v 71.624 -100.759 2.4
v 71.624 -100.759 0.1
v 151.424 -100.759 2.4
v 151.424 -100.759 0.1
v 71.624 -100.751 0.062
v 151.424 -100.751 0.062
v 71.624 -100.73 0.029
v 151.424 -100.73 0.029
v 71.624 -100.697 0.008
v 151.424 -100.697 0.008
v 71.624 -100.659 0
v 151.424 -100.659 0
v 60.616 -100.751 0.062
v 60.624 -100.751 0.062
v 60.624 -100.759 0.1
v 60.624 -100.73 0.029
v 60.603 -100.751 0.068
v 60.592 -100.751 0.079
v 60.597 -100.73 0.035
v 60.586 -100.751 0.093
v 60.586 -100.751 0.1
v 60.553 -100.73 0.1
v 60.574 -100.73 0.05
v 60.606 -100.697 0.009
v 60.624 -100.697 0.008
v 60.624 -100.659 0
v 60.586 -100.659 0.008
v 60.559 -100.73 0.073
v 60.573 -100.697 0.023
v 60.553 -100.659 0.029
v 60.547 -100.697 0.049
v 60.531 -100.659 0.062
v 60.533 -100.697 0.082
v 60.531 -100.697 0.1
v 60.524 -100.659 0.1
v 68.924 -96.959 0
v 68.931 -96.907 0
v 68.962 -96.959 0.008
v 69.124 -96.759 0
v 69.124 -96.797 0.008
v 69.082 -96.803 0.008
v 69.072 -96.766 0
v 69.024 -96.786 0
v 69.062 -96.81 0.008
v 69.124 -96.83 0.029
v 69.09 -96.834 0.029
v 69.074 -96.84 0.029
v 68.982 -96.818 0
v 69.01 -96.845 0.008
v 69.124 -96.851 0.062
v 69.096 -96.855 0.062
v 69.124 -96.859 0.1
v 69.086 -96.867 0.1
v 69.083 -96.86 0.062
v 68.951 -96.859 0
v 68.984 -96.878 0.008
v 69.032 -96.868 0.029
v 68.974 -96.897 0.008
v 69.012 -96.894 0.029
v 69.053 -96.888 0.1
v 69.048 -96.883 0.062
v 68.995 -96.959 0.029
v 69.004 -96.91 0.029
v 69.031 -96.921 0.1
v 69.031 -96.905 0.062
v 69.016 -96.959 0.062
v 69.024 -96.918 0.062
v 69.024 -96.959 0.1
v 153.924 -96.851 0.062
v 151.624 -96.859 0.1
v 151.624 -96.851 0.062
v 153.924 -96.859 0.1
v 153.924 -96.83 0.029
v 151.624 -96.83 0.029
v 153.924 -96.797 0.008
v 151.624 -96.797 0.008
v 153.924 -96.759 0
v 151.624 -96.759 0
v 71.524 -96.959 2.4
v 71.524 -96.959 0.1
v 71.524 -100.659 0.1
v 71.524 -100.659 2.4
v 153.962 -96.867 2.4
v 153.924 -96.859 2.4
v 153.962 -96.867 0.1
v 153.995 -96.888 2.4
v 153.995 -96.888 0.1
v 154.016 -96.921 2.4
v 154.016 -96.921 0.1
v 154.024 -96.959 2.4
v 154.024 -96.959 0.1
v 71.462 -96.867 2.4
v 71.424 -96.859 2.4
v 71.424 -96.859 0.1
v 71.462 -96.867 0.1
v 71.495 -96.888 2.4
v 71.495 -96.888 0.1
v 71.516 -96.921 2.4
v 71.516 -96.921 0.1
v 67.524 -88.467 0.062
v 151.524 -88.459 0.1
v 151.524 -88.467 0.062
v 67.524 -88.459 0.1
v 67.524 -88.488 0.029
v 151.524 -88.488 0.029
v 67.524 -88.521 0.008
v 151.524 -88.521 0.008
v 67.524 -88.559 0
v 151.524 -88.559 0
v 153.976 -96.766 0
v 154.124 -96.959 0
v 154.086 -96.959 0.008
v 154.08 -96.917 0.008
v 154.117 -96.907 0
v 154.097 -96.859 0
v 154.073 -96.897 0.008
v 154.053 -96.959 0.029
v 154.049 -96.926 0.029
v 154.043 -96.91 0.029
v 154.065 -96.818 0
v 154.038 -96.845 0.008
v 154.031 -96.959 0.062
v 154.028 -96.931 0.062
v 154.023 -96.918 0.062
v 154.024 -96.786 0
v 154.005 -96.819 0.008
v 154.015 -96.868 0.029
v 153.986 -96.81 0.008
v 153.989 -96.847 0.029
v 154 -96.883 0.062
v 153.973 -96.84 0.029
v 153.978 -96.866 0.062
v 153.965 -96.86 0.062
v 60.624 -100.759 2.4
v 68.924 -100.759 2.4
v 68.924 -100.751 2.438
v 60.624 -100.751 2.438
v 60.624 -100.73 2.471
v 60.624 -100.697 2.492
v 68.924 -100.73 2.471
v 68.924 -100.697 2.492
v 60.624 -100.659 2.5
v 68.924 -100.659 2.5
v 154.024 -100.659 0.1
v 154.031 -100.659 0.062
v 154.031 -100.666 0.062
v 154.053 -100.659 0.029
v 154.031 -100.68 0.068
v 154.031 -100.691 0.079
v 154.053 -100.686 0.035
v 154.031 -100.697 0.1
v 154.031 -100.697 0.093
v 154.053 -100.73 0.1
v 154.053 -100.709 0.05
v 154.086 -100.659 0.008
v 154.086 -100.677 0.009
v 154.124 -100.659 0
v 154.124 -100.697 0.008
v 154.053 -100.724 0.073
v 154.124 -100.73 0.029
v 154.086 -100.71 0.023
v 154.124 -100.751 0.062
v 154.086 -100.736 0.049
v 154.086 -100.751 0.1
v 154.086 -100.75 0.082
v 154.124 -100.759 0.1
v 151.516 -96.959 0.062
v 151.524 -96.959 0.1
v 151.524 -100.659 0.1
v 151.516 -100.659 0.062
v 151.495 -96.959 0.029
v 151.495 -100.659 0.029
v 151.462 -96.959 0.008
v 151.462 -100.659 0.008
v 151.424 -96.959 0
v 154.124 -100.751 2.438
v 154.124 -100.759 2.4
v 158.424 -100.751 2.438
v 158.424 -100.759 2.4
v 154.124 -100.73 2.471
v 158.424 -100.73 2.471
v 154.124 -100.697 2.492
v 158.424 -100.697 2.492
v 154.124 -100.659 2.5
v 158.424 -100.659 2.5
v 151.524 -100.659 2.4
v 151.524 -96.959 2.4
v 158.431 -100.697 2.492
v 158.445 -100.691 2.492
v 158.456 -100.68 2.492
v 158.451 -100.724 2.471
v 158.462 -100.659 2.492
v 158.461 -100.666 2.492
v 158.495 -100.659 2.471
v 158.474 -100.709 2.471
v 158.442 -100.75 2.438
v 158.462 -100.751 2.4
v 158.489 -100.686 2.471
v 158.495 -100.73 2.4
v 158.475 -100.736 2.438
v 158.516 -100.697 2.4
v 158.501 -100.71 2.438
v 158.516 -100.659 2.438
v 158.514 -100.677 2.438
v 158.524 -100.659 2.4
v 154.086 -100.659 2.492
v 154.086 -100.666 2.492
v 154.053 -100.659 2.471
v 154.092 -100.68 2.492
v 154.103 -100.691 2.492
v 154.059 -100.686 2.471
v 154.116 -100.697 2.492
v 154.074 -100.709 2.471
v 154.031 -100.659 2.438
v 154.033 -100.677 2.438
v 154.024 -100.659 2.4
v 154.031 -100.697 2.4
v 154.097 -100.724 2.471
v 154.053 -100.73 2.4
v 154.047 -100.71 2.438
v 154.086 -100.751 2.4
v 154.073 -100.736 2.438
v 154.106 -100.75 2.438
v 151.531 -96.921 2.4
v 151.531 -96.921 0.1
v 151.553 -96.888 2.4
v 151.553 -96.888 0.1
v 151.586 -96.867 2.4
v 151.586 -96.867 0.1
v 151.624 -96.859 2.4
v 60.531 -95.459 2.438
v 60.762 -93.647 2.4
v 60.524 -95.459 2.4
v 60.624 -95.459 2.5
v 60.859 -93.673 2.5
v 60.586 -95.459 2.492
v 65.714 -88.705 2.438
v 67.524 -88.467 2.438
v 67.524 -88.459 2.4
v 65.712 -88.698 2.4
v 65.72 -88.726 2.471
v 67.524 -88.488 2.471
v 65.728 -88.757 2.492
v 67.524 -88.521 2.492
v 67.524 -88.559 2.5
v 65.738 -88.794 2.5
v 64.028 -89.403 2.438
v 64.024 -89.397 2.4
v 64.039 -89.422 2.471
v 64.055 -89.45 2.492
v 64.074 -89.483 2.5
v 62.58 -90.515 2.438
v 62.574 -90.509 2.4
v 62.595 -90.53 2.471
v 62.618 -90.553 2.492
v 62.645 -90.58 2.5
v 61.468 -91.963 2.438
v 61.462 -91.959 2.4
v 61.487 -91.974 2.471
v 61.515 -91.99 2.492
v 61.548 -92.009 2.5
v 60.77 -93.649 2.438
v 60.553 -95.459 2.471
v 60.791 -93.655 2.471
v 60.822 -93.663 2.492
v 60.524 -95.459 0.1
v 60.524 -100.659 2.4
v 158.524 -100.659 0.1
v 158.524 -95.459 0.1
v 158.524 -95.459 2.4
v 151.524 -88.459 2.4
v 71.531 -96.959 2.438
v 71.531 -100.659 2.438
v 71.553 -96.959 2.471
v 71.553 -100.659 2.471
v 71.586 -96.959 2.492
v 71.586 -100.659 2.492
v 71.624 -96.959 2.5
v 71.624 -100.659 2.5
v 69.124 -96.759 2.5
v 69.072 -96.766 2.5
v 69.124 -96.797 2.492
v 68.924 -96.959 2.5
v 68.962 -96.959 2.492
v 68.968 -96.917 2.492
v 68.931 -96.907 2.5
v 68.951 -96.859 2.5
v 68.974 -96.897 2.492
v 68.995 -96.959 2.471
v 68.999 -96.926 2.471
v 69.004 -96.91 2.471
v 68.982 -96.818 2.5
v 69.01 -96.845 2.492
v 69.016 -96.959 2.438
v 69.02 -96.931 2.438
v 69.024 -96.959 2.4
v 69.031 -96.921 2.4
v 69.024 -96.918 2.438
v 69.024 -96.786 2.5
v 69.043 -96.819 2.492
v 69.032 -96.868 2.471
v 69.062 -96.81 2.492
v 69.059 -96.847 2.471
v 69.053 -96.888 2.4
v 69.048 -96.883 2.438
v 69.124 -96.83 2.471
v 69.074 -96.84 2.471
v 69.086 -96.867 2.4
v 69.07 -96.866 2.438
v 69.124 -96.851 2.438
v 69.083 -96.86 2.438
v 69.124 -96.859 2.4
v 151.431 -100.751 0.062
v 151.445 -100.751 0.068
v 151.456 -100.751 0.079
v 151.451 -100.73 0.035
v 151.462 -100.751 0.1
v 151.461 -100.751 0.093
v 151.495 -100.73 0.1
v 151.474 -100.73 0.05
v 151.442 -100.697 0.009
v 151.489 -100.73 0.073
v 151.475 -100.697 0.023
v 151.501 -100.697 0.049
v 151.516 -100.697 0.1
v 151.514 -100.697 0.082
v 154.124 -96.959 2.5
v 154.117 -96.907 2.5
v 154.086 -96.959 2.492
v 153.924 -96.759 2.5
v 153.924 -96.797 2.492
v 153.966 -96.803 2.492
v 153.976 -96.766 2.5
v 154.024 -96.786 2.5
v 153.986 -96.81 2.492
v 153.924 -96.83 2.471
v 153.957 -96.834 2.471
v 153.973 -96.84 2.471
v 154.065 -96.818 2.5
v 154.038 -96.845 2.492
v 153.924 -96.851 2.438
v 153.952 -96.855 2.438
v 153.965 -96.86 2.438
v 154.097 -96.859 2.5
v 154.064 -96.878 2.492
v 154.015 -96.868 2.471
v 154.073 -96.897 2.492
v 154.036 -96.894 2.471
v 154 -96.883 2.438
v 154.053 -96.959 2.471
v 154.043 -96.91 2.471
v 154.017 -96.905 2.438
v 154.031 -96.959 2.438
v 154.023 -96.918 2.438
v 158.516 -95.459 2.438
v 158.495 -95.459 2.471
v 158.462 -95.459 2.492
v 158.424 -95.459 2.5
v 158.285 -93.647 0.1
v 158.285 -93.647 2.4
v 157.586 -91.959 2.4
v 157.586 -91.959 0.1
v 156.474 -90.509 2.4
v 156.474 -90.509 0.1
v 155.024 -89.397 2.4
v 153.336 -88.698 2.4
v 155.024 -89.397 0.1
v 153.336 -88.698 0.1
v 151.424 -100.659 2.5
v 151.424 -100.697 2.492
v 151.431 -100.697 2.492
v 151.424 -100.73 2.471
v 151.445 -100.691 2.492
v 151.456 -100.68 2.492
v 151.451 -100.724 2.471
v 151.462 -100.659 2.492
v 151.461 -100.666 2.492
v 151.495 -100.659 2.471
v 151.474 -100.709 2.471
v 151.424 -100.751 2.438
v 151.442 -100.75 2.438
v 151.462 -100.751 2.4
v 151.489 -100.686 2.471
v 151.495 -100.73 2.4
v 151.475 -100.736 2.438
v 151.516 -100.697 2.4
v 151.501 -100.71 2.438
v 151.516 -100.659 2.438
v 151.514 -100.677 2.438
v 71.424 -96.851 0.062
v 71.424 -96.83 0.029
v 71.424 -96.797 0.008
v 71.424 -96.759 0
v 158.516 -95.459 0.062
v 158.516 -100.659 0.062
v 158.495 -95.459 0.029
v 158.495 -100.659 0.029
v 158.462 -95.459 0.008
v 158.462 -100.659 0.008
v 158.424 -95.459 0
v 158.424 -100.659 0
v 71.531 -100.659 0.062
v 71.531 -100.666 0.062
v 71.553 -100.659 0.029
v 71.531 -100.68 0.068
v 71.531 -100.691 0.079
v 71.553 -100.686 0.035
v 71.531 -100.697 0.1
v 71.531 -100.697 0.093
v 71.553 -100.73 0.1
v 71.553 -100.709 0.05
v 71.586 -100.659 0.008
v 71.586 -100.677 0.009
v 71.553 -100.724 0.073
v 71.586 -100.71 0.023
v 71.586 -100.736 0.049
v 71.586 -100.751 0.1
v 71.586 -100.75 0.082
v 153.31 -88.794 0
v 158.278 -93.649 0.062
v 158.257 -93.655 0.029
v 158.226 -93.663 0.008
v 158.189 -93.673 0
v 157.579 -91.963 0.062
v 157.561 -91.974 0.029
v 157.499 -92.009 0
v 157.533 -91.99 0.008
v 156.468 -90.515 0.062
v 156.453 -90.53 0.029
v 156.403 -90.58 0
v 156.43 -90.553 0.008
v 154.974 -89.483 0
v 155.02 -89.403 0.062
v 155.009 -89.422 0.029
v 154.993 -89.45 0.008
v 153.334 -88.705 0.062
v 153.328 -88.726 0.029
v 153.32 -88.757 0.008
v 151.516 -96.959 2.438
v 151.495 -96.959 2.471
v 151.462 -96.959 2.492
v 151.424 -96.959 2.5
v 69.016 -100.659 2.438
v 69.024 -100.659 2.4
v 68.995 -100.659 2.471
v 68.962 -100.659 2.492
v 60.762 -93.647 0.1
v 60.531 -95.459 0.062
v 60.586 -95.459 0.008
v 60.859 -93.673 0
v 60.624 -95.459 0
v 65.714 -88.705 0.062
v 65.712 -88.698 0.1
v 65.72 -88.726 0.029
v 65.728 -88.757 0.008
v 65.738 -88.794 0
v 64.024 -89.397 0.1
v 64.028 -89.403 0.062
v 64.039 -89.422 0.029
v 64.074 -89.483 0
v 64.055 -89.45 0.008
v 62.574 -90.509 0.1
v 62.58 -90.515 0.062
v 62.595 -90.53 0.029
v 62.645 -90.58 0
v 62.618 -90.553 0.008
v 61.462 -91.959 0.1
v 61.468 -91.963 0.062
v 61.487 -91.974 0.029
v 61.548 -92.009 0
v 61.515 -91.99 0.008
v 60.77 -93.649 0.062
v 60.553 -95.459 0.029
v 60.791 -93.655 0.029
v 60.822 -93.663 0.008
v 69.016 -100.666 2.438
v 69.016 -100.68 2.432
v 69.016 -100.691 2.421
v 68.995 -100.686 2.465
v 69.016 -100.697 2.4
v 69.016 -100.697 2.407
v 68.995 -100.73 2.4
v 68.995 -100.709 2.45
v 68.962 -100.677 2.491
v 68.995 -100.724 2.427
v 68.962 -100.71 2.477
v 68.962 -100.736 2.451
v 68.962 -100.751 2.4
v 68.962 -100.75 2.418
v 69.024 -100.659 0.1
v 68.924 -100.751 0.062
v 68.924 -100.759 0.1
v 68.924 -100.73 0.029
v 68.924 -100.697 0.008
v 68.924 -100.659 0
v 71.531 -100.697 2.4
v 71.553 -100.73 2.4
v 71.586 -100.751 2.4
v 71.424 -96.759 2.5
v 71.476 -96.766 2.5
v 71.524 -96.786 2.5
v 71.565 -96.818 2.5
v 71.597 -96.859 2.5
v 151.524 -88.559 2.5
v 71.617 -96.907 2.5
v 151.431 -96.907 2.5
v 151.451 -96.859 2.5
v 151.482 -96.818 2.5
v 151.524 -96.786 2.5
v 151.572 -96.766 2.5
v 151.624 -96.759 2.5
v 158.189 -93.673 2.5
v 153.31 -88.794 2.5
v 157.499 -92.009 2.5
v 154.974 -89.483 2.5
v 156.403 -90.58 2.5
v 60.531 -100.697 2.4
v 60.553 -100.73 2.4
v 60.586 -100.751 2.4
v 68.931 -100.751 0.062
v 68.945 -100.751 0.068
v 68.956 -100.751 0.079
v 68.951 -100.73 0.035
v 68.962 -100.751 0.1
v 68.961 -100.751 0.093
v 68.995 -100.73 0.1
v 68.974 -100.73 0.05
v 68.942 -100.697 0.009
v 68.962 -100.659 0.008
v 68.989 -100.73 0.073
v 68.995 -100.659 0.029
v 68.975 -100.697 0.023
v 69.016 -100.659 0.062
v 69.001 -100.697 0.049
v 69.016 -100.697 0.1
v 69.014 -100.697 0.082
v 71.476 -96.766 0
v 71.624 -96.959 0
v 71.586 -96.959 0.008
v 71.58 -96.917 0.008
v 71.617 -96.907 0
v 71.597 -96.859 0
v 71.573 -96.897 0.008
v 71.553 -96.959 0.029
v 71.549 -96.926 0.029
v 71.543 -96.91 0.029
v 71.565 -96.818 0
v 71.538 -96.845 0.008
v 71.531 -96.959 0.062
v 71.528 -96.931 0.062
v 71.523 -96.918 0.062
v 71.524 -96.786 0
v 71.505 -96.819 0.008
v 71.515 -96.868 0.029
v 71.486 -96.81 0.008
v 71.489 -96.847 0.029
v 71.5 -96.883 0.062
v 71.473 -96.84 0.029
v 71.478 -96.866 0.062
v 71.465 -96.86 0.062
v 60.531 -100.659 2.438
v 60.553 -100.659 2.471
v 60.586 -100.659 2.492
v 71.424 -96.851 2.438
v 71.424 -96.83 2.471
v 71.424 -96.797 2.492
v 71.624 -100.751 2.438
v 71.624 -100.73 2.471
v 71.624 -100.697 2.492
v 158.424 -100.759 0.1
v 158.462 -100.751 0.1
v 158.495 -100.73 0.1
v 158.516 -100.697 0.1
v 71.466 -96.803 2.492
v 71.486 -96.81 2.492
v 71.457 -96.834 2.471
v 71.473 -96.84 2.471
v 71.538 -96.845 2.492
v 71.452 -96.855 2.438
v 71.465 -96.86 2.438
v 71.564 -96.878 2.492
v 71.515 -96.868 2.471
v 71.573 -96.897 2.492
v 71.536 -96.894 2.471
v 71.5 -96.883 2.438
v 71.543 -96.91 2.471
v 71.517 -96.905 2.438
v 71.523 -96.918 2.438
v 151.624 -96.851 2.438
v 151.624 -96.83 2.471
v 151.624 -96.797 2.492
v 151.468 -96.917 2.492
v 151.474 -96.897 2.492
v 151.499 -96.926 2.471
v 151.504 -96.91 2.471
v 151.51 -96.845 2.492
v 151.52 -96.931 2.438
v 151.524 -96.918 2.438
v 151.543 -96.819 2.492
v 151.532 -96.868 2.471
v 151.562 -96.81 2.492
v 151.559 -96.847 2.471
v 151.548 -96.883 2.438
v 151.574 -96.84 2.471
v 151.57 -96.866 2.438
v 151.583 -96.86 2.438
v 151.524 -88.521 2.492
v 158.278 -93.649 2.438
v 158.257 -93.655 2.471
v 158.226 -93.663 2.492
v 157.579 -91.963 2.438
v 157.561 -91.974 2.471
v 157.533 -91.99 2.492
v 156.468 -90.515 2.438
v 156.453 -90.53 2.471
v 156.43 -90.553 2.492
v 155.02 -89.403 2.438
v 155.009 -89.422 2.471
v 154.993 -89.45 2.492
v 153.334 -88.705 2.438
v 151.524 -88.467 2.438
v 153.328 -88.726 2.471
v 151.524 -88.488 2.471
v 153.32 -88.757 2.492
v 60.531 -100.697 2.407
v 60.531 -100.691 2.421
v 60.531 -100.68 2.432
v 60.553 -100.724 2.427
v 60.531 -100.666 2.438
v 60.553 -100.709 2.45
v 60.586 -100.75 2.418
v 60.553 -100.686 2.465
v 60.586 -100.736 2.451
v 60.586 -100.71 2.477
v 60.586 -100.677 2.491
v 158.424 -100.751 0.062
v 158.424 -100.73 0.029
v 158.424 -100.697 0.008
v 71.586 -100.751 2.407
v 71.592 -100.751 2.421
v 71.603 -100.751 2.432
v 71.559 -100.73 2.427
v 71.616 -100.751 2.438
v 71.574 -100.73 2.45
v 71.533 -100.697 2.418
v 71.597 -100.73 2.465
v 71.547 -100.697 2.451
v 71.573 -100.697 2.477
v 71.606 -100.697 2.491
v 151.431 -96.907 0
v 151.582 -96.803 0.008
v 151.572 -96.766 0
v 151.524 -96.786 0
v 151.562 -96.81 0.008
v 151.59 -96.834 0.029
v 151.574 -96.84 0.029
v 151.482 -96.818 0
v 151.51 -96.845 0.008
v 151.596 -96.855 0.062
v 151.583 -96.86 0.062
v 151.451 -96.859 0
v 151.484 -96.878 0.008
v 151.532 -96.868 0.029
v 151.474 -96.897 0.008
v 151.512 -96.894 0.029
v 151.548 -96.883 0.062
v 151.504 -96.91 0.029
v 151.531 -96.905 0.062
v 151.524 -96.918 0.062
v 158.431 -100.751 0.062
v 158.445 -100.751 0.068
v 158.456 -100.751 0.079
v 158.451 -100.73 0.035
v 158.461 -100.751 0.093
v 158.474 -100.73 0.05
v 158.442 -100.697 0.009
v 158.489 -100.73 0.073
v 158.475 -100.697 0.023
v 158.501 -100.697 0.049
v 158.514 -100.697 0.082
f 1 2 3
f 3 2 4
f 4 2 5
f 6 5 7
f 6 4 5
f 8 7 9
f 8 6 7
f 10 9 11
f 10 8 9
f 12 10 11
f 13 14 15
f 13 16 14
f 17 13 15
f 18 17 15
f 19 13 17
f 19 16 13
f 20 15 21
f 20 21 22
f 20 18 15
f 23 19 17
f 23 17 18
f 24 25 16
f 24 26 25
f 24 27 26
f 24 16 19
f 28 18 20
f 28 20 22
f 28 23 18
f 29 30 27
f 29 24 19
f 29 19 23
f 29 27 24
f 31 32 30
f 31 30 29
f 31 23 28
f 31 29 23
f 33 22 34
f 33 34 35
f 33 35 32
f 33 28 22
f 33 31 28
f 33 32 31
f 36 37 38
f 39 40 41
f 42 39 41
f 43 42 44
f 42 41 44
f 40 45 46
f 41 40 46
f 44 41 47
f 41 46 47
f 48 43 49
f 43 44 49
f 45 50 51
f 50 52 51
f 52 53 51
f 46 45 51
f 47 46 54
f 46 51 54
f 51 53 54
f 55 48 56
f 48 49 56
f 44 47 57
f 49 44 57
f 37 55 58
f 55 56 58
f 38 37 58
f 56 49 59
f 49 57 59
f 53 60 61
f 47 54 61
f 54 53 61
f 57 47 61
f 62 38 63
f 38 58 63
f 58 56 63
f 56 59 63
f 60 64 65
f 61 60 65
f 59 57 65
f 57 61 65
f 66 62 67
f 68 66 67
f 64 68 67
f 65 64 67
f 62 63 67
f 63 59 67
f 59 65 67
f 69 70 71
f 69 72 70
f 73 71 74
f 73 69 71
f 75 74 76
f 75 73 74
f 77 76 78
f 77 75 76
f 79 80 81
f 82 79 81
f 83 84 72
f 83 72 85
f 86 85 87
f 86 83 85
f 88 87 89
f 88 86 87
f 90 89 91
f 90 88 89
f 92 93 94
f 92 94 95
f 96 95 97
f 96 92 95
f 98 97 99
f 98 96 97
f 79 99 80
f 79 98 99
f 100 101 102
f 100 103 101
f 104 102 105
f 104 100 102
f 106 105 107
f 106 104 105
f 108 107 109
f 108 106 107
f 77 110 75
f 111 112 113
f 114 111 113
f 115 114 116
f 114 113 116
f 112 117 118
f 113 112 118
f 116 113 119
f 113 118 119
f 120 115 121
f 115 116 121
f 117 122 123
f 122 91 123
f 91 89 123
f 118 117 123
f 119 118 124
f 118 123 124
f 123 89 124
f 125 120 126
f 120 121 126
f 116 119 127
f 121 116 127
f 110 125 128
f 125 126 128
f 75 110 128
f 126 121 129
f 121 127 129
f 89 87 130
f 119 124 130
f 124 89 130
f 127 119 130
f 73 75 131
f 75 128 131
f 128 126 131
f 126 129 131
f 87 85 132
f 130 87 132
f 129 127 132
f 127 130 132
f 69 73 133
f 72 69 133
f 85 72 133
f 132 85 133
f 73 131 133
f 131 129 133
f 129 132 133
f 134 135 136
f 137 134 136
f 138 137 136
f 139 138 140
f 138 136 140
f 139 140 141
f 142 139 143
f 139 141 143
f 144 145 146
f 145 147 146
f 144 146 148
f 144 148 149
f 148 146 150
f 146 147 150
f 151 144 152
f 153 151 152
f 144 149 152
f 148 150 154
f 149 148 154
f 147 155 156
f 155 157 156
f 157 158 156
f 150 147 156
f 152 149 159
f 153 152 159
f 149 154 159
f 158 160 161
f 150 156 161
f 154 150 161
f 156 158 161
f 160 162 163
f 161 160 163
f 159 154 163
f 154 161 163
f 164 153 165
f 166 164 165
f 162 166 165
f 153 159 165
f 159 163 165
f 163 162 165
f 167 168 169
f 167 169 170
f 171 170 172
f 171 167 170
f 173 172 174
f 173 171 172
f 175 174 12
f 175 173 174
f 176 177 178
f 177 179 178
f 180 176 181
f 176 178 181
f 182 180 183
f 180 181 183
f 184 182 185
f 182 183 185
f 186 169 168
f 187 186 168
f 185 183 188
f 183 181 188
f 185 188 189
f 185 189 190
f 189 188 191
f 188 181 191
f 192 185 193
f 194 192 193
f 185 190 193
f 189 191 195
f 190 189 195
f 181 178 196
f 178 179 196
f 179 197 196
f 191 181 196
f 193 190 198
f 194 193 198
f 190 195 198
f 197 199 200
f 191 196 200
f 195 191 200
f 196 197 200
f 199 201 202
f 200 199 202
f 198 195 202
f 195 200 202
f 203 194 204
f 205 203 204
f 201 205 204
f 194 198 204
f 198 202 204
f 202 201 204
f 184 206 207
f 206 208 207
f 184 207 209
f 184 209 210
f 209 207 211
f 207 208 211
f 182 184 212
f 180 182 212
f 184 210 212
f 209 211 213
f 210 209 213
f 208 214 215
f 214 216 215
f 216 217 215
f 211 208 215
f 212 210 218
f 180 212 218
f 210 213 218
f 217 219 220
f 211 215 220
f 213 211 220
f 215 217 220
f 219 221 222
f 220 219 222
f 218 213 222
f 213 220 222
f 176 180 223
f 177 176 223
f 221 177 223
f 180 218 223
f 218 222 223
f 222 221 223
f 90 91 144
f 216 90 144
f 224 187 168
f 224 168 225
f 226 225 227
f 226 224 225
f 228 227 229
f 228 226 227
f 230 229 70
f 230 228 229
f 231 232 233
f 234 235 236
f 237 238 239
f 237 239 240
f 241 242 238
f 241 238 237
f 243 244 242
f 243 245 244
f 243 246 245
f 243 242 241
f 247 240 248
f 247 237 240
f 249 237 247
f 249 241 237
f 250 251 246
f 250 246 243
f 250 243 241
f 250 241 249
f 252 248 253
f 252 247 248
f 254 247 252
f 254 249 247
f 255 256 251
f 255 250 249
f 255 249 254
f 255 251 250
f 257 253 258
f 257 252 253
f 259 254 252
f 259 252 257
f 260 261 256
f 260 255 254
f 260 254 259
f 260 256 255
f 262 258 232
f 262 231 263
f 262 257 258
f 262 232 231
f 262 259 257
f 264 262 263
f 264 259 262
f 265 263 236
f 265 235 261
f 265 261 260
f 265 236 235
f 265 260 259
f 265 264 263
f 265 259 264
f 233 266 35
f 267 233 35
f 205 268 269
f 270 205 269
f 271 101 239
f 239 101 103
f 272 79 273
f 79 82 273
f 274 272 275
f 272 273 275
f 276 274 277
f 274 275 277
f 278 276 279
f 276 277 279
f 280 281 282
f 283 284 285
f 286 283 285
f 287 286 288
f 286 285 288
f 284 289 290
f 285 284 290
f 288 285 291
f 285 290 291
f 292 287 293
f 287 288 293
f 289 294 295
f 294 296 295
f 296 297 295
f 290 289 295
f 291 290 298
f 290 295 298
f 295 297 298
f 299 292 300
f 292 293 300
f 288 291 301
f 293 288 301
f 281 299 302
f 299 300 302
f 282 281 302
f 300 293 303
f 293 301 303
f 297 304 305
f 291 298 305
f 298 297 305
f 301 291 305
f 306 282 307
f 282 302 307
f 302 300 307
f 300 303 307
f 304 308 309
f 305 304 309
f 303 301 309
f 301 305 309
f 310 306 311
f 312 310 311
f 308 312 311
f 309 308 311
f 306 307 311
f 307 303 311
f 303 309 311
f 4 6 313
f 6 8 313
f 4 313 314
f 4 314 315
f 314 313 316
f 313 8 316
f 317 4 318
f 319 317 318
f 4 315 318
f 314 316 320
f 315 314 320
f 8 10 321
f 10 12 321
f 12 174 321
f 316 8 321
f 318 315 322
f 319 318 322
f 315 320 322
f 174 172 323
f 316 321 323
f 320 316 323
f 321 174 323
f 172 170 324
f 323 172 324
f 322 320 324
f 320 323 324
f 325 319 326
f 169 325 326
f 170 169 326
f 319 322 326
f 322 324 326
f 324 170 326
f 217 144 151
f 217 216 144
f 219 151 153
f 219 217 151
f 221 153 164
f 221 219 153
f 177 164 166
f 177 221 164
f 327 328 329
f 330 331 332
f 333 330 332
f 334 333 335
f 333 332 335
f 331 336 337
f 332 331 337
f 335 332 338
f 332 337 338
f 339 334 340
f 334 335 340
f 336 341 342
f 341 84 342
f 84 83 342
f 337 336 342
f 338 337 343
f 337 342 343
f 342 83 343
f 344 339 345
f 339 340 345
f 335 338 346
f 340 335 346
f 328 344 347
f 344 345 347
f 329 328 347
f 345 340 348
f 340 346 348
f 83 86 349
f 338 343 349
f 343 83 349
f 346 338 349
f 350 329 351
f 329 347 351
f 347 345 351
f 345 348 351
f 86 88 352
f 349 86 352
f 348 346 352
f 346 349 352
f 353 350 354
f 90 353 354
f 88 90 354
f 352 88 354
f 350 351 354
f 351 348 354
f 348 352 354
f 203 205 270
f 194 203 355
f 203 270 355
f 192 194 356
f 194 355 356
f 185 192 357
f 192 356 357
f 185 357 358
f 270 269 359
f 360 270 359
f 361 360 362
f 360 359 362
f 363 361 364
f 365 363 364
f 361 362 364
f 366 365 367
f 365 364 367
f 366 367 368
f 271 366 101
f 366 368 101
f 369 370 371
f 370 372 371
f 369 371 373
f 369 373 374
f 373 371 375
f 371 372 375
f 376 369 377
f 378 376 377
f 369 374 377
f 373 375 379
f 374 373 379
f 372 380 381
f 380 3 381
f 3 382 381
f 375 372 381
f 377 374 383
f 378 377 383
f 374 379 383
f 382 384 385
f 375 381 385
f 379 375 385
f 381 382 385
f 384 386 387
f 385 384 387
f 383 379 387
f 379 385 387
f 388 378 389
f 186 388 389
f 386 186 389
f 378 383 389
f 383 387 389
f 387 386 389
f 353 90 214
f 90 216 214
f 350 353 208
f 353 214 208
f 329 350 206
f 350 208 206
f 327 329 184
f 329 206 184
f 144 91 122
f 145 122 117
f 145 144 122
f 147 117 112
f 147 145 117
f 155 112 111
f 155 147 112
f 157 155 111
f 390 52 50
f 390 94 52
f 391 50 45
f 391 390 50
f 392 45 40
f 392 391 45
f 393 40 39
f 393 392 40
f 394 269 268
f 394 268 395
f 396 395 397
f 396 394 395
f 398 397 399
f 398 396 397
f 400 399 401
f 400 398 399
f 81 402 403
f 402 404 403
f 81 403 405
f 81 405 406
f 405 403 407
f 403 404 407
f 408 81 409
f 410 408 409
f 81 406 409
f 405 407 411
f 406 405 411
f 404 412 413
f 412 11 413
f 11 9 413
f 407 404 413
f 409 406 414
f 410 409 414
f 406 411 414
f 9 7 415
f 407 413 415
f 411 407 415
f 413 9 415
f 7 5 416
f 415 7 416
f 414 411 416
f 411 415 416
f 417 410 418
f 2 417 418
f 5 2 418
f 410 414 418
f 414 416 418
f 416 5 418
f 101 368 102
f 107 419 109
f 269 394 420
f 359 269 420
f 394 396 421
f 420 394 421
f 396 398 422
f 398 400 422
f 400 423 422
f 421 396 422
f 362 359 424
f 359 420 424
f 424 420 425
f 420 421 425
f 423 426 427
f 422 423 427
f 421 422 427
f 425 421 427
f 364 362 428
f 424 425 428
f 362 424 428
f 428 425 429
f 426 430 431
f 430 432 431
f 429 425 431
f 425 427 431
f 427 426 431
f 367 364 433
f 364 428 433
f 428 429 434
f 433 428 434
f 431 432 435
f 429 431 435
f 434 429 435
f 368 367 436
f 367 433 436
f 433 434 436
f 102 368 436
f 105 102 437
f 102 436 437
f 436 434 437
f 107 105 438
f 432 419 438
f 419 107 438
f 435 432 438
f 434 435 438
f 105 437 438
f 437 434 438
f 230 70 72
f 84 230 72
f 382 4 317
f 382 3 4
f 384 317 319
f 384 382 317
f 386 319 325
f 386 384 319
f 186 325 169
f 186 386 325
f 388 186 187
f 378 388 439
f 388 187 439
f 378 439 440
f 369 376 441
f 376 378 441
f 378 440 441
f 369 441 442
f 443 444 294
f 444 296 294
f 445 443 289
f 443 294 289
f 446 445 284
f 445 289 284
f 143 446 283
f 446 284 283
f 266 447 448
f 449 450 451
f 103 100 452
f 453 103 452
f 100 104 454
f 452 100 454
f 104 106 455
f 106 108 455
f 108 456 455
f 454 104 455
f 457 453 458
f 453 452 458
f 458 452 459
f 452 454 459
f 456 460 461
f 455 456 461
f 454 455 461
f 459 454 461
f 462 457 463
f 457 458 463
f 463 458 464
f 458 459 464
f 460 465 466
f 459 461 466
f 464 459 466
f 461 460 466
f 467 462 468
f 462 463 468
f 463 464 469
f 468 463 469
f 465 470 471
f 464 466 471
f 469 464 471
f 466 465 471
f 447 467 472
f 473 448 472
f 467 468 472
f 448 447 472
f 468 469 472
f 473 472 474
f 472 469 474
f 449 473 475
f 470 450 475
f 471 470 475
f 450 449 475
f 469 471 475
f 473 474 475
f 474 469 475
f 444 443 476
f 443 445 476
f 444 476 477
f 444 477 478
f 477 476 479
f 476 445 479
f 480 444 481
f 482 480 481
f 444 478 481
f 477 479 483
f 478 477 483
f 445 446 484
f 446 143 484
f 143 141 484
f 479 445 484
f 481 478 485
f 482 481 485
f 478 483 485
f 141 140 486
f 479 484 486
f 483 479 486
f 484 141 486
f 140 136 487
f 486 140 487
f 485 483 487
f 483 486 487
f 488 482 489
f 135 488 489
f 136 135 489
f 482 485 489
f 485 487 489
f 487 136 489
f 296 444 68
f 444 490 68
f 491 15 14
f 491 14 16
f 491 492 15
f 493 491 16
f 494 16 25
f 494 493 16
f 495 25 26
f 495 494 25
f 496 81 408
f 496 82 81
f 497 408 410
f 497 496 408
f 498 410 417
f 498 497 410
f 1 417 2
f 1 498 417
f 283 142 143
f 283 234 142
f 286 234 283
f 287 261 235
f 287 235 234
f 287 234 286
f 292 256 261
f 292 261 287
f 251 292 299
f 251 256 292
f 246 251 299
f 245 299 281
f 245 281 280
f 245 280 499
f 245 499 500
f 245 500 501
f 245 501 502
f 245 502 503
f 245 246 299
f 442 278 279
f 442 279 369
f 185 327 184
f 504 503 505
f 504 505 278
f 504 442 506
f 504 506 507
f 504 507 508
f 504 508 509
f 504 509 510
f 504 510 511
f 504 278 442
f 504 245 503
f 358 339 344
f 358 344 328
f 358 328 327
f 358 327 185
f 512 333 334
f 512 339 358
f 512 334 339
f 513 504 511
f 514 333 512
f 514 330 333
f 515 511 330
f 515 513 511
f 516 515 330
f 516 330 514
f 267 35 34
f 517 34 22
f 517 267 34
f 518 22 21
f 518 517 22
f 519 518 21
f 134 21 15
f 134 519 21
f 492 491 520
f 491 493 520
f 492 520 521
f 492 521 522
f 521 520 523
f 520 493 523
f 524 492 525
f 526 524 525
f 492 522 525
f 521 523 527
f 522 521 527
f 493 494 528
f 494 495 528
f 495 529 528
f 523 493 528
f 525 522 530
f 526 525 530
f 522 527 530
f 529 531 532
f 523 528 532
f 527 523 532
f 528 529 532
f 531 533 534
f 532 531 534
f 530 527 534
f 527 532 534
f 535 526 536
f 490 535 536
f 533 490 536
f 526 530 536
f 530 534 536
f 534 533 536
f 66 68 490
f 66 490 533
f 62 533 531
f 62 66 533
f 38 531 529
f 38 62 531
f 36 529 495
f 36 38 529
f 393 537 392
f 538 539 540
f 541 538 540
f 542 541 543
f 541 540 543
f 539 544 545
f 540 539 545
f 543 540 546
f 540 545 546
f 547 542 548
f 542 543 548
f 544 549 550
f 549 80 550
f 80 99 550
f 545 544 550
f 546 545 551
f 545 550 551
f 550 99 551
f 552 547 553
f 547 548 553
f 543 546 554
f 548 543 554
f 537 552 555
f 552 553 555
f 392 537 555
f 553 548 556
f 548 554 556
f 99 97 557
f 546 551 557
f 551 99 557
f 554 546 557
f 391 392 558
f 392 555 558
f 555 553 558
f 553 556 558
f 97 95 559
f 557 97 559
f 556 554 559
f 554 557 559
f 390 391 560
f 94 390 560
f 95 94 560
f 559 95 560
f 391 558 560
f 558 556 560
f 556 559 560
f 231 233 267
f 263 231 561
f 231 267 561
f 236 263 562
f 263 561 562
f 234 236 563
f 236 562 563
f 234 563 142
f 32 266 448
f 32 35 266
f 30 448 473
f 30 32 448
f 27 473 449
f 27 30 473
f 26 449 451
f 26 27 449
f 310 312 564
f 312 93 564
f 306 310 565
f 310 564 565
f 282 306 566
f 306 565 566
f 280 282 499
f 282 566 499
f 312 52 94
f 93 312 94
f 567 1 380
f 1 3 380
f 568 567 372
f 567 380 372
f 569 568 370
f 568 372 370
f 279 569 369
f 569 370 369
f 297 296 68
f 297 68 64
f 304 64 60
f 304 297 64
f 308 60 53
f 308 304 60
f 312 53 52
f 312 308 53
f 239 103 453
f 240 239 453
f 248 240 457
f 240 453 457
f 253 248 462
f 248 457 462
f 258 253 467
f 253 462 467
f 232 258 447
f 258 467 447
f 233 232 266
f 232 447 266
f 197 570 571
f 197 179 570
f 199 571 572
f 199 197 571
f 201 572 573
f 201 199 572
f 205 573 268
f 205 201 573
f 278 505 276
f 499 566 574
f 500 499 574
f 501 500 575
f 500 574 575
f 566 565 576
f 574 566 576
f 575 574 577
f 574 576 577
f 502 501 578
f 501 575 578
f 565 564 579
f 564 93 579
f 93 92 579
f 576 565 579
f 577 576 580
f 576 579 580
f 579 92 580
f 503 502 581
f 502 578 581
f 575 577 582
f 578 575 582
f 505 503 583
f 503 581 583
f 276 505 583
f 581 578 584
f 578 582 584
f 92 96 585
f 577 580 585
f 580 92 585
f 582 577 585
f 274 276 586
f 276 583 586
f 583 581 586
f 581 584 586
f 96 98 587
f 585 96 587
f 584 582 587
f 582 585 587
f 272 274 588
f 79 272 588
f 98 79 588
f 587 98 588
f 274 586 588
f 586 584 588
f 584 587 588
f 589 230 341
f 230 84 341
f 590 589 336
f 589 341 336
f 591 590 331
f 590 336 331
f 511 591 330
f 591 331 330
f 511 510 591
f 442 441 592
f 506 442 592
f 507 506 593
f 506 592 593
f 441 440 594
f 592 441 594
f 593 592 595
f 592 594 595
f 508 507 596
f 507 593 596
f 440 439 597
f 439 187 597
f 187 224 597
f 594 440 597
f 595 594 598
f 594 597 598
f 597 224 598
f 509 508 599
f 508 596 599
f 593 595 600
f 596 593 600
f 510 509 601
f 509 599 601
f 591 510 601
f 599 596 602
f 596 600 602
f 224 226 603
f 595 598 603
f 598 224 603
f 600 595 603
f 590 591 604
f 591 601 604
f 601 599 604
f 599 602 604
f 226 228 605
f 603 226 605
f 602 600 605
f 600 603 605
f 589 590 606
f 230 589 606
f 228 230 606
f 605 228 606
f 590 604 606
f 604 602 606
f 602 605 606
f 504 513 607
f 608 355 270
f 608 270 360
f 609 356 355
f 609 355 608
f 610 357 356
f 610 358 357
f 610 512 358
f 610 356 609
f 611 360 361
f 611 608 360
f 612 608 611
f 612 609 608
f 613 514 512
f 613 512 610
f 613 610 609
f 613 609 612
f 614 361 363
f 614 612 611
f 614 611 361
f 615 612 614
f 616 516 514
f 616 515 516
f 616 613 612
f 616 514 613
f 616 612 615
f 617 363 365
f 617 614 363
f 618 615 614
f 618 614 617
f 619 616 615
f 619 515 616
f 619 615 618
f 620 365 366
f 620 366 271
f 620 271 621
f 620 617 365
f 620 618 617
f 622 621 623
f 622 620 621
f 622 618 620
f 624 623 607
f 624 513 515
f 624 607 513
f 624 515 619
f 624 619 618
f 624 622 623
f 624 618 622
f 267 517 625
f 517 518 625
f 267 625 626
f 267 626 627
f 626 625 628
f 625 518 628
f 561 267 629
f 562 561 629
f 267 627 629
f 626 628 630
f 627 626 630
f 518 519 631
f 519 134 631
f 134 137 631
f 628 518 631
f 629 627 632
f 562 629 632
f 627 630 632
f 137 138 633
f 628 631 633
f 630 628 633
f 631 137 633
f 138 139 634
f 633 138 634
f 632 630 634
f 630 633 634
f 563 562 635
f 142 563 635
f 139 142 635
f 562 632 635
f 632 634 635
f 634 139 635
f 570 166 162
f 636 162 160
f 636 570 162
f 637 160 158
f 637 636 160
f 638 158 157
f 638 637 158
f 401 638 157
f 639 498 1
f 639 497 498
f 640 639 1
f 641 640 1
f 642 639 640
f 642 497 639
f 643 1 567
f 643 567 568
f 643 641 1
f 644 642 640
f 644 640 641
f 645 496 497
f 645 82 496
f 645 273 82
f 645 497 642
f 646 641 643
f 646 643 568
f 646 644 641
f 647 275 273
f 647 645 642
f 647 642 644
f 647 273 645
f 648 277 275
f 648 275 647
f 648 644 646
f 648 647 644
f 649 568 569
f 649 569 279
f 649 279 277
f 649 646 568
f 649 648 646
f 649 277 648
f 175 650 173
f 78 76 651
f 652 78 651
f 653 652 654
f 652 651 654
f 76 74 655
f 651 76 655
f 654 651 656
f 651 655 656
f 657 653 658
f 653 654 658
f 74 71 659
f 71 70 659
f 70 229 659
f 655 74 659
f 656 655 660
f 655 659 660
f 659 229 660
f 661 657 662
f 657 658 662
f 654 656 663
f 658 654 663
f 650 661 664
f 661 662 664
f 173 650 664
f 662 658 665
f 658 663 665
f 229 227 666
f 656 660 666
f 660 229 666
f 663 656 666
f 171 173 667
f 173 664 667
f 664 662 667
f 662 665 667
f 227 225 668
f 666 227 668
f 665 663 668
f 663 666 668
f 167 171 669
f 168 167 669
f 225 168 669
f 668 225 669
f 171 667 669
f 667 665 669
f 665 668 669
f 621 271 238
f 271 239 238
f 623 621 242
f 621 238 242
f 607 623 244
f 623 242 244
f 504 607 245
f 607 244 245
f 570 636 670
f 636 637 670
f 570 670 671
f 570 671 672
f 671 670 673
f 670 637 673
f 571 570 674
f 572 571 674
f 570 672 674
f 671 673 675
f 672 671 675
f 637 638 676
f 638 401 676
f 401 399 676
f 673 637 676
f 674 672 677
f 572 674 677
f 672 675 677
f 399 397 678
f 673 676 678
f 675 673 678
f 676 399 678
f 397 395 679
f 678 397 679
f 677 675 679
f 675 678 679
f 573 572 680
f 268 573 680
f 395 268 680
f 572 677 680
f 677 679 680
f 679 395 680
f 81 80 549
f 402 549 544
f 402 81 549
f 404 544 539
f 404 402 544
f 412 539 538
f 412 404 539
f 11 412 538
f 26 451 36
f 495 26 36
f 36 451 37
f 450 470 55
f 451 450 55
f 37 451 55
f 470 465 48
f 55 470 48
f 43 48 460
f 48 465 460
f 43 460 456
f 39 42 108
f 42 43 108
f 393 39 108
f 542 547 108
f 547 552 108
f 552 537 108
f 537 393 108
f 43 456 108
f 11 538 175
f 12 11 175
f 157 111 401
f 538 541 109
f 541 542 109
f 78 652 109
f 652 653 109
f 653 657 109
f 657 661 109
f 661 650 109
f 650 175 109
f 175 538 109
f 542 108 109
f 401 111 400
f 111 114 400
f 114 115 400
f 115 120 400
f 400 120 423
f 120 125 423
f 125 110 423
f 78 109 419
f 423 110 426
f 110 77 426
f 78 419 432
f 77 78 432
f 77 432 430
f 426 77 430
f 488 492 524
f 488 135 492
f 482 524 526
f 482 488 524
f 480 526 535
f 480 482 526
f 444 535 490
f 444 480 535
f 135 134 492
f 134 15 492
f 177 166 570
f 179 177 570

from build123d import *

# Parameters (mm, degrees)
RESSALTO_EXTRUS_O1_DEPTH = 2.5
FILETE1_R                = 0.1


with BuildPart() as part:
    # Esboço1 → Ressalto-extrusão1 (new body)
    with BuildSketch(Plane.XY):
        with BuildLine():
            Line((60.523872434, -95.459023636), (60.523872434, -100.759023636))
            Line((60.523872434, -100.759023636), (69.023872434, -100.759023636))
            Line((69.023872434, -100.759023636), (69.023872434, -96.859023636))
            Line((69.023872434, -96.859023636), (71.523872434, -96.859023636))
            Line((71.523872434, -96.859023636), (71.523872434, -100.759023636))
            Line((71.523872434, -100.759023636), (151.523872434, -100.759023636))
            Line((151.523872434, -100.759023636), (151.523872434, -96.859023636))
            Line((151.523872434, -96.859023636), (154.023872434, -96.859023636))
            Line((154.023872434, -96.859023636), (154.023872434, -100.759023636))
            Line((154.023872434, -100.759023636), (158.523872434, -100.759023636))
            Line((158.523872434, -100.759023636), (158.523872434, -95.459023636))
            ThreePointArc((158.523872434, -95.459023636), (156.473619903, -90.509276168), (151.523872434, -88.459023636))
            Line((151.523872434, -88.459023636), (67.523872434, -88.459023636))
            ThreePointArc((67.523872434, -88.459023636), (62.574124966, -90.509276168), (60.523872434, -95.459023636))
        make_face()
    extrude(amount=RESSALTO_EXTRUS_O1_DEPTH)

    # Filete1
    filete1_edges = [part.edges().sort_by_distance(p)[0] for p in [
        (64.773872434, -100.759023636, 2.5),
        (109.523872434, -88.459023636, 0),
        (156.473619903, -90.509276168, 0),
        (158.523872434, -98.109023636, 0),
        (156.273872434, -100.759023636, 0),
        (154.023872434, -98.809023636, 0),
        (152.773872434, -96.859023636, 0),
        (69.023872434, -98.809023636, 2.5),
        (151.523872434, -98.809023636, 0),
        (111.523872434, -100.759023636, 0),
        (71.523872434, -98.809023636, 0),
        (70.273872434, -96.859023636, 0),
        (69.023872434, -98.809023636, 0),
        (64.773872434, -100.759023636, 0),
        (60.523872434, -98.109023636, 0),
        (62.574124966, -90.509276168, 0),
        (70.273872434, -96.859023636, 2.5),
        (71.523872434, -98.809023636, 2.5),
        (158.523872434, -100.759023636, 1.25),
        (154.023872434, -100.759023636, 1.25),
        (154.023872434, -96.859023636, 1.25),
        (151.523872434, -96.859023636, 1.25),
        (151.523872434, -100.759023636, 1.25),
        (71.523872434, -100.759023636, 1.25),
        (71.523872434, -96.859023636, 1.25),
        (69.023872434, -96.859023636, 1.25),
        (69.023872434, -100.759023636, 1.25),
        (60.523872434, -100.759023636, 1.25),
        (111.523872434, -100.759023636, 2.5),
        (151.523872434, -98.809023636, 2.5),
        (152.773872434, -96.859023636, 2.5),
        (154.023872434, -98.809023636, 2.5),
        (156.273872434, -100.759023636, 2.5),
        (158.523872434, -98.109023636, 2.5),
        (62.574124966, -90.509276168, 2.5),
        (156.473619903, -90.509276168, 2.5),
        (109.523872434, -88.459023636, 2.5),
        (60.523872434, -98.109023636, 2.5),
    ]]
    fillet(filete1_edges, radius=FILETE1_R)


solid = part.part
